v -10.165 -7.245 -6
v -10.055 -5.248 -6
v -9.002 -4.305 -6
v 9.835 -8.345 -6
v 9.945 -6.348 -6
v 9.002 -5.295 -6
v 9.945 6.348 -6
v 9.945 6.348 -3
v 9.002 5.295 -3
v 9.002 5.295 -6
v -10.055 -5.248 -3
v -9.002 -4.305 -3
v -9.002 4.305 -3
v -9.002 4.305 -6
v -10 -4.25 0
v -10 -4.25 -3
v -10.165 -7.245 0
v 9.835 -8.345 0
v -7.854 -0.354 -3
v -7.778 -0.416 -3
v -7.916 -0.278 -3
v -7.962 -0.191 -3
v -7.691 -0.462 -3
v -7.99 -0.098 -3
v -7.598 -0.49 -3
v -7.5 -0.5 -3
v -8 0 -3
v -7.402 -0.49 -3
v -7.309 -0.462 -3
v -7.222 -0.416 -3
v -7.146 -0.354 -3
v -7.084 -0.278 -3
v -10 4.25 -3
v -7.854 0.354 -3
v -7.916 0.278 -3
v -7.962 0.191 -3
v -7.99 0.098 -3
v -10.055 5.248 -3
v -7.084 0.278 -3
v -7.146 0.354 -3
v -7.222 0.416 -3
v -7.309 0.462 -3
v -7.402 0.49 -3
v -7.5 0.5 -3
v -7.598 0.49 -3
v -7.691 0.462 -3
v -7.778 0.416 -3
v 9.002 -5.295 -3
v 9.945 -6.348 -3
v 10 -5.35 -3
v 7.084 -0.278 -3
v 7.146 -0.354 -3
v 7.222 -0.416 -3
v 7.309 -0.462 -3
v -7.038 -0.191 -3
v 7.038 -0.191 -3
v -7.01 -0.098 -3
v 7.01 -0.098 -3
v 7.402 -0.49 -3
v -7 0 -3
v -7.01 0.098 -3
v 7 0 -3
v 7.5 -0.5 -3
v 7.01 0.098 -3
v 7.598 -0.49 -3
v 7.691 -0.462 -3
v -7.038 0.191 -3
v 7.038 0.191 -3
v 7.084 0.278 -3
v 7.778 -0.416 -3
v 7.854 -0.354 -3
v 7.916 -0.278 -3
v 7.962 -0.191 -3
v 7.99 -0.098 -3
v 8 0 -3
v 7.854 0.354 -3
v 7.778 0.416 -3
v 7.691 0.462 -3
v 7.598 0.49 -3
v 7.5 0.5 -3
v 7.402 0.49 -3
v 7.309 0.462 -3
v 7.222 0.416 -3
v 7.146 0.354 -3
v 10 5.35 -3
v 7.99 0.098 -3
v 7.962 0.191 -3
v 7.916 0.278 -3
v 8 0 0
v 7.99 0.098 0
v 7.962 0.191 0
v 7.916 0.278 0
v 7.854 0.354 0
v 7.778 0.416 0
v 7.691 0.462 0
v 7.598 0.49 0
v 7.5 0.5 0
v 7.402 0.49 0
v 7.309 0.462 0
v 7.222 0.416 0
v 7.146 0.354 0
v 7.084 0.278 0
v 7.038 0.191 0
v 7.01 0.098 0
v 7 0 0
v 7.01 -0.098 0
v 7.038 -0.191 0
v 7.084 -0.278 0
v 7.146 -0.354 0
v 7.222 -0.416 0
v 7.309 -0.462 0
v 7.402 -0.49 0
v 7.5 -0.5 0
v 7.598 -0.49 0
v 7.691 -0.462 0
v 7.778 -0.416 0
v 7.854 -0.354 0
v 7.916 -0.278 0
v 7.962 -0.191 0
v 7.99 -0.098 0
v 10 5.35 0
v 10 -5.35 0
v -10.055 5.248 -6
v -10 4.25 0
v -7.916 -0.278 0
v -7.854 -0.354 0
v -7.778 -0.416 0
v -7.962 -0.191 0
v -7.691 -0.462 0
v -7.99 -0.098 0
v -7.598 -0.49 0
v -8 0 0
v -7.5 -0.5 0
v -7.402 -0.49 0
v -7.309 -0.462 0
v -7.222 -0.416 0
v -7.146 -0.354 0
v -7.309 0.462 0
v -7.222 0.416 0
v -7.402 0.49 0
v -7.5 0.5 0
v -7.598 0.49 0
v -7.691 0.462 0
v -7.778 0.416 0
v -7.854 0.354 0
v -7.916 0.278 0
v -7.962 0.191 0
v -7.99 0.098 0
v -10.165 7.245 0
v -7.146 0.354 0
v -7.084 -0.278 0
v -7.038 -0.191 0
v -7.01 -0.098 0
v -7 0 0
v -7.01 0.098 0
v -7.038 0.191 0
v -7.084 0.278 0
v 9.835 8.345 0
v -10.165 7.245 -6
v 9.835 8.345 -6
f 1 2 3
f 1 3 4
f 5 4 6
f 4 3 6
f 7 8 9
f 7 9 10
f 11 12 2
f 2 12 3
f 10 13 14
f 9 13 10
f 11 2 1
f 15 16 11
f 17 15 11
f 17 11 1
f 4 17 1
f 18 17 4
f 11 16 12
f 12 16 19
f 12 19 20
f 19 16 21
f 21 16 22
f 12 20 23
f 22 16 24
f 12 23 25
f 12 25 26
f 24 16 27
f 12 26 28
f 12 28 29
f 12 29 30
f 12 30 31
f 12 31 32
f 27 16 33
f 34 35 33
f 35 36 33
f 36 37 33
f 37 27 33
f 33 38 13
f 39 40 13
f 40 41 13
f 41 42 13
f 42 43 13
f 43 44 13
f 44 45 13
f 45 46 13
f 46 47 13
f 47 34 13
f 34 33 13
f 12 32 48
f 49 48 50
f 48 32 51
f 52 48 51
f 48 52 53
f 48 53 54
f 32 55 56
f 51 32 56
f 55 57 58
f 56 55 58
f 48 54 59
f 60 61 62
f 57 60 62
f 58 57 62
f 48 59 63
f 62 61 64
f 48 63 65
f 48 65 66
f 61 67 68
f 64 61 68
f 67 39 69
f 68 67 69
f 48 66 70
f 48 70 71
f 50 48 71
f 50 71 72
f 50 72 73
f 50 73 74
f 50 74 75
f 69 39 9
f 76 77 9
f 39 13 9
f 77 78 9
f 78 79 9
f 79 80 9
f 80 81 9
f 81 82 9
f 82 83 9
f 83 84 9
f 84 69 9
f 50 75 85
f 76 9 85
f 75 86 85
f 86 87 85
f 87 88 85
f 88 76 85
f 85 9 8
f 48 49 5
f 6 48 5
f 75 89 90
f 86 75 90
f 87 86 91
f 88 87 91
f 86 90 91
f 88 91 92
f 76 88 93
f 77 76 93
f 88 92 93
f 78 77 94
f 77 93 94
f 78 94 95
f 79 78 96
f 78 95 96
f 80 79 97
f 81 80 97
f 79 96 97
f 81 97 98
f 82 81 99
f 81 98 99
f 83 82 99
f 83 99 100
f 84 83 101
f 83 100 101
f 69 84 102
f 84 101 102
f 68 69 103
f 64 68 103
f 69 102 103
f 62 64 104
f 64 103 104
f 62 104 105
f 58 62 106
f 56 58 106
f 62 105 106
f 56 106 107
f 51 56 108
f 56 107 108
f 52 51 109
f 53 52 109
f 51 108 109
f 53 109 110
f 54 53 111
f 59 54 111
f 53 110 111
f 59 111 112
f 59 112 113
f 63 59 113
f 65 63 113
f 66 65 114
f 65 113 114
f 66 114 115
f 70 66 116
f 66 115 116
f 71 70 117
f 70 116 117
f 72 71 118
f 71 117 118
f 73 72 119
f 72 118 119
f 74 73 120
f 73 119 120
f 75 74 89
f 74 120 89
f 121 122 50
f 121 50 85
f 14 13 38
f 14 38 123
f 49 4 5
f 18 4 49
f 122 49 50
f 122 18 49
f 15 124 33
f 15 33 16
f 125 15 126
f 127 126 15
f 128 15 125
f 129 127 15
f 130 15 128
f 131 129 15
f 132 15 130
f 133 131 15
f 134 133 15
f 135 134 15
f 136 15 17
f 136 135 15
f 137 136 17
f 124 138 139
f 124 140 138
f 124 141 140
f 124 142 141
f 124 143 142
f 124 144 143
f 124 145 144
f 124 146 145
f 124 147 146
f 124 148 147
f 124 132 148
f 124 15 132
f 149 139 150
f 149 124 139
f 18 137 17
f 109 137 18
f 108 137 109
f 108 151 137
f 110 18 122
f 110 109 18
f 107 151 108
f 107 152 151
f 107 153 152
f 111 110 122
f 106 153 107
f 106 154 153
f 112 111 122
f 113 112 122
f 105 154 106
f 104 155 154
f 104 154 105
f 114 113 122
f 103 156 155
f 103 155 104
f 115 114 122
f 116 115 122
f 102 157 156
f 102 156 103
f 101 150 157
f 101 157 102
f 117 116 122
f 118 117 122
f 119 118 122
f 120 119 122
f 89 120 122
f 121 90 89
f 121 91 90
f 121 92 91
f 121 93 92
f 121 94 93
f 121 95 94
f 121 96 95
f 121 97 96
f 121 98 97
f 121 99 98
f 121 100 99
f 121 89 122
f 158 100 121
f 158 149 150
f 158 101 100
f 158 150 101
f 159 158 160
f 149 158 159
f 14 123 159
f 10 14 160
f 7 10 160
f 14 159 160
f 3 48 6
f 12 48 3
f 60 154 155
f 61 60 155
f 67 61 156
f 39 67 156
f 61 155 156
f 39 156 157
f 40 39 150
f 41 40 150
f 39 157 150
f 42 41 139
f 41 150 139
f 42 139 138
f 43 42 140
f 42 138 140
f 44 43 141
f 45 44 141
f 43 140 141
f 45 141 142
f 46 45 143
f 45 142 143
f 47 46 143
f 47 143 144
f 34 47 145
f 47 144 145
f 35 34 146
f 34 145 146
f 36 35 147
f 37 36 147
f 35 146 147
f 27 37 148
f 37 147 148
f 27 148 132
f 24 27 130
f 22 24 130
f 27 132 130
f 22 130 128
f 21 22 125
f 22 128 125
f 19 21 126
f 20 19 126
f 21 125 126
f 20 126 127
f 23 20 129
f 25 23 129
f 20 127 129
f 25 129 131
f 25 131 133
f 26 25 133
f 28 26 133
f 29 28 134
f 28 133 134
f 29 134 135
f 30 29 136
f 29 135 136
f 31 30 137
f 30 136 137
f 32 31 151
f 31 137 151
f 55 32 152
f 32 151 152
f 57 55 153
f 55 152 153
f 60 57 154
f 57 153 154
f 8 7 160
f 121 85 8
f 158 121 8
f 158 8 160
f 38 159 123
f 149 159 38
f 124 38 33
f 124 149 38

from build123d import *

# Parameters (mm, degrees)
F1_DEPTH = 6
F3_DEPTH = 3
F4_R     = 0.5
F5_DEPTH = 3
F6_SIZE  = 1


with BuildPart() as f1:
    # F0 (on Top) → F1 (new body)
    with BuildSketch(Plane.XY):
        Polygon((10, -5.35), (-10, -4.25), (-10.1647510023, -7.2454727686), (9.8352489977, -8.3454727686), align=None)
    extrude(amount=-F1_DEPTH)



with BuildPart() as f1b:
    # F0 (on Top) → F1, piece 2 (new body)
    with BuildSketch(Plane.XY):
        Polygon((9.8352489977, 8.3454727686), (-10.1647510023, 7.2454727686), (-10, 4.25), (10, 5.35), align=None)
    extrude(amount=-F1_DEPTH)


with BuildPart() as f1_1:
    add(f1.part)

    add(f1b.part)  # F3 merges F1b
    # F2 (on face) → F3 (join)
    with BuildSketch(Plane.XY):
        Polygon((10, 5.35), (-10, 4.25), (-10, -4.25), (10, -5.35), align=None)
    extrude(amount=-F3_DEPTH)

    # F4 (on face) → F5 (cut)
    with BuildSketch(Plane.XY):
        with Locations((-7.5, 0)):
            Circle(F4_R)
        with Locations((7.5, 0)):
            Circle(F4_R)
    extrude(amount=-F5_DEPTH, mode=Mode.SUBTRACT)

    # F6
    f6_edges = [f1_1.edges().sort_by_distance(p)[0] for p in [
        (-10, 4.25, -4.5),
        (-10, 4.25, -1.5),
        (10, 5.35, -1.5),
        (10, 5.35, -4.5),
        (10, -5.35, -1.5),
        (10, -5.35, -4.5),
        (-10, -4.25, -4.5),
        (-10, -4.25, -1.5),
    ]]
    chamfer(f6_edges, length=F6_SIZE)


solid = f1_1.part
